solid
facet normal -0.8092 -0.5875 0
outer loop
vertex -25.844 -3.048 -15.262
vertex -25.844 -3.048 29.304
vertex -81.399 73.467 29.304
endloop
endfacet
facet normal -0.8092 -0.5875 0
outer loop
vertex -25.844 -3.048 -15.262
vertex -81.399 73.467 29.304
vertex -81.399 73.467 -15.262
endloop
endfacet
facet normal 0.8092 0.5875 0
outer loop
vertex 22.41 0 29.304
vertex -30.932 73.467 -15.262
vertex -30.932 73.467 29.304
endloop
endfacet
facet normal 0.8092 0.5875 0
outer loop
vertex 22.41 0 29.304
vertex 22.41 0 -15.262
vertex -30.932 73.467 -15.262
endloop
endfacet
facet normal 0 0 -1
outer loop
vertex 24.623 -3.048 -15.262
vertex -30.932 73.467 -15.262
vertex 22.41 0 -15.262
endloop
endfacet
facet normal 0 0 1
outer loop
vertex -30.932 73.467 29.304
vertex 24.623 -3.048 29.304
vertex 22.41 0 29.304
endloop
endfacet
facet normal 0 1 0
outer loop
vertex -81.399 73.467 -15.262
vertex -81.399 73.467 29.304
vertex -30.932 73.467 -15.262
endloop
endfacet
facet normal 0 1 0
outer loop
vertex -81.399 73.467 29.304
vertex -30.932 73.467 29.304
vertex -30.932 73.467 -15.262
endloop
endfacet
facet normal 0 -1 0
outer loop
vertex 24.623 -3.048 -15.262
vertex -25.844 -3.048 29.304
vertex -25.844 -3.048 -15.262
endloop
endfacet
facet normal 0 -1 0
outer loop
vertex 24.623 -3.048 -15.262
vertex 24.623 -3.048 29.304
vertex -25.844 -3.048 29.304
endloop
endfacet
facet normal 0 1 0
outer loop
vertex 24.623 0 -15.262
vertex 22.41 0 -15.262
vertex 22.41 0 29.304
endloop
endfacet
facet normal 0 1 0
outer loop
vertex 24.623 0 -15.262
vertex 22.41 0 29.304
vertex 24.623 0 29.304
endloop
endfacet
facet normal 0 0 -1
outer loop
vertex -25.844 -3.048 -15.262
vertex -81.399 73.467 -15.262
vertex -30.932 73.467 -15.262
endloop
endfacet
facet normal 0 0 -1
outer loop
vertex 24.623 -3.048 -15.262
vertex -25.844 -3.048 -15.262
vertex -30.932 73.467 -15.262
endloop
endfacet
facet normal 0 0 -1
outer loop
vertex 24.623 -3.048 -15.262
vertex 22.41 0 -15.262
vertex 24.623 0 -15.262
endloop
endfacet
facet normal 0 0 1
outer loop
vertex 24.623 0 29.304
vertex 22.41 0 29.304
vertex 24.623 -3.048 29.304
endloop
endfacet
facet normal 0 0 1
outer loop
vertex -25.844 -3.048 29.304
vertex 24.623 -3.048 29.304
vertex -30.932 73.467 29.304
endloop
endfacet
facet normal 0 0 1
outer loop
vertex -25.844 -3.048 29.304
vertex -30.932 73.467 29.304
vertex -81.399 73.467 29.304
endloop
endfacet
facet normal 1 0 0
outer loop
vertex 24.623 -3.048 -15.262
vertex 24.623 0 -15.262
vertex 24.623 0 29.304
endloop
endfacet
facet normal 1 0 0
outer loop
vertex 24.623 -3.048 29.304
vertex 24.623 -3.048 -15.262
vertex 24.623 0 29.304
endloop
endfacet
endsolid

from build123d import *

# Parameters (mm, degrees)
F0_W      = 50.467223
F0_H      = 44.565819
F1_DEPTH  = 3.048
F1_FACE_W = 50.467222
F1_FACE_H = 44.56582


with BuildPart() as f1:
    # F0 (on Front) → F1 (new body)
    with BuildSketch(Plane.XZ):
        with Locations((-0.610485, 7.020649)):
            Rectangle(F0_W, F0_H)
    extrude(amount=F1_DEPTH)

    # F3: sweep along a path in F2
    with BuildLine(Plane.XY) as f3_path:
        Line((-55.554643, 76.514833), (0, 0))
    # F1_face (on face) → F3 (sweep)
    with BuildSketch(Plane(origin=(-0.610486, -3.048, 7.020649), x_dir=(1, 0, 0), z_dir=(0, -1, 0))):
        Rectangle(F1_FACE_W, F1_FACE_H)
    sweep(path=f3_path.line)


solid = f1.part
